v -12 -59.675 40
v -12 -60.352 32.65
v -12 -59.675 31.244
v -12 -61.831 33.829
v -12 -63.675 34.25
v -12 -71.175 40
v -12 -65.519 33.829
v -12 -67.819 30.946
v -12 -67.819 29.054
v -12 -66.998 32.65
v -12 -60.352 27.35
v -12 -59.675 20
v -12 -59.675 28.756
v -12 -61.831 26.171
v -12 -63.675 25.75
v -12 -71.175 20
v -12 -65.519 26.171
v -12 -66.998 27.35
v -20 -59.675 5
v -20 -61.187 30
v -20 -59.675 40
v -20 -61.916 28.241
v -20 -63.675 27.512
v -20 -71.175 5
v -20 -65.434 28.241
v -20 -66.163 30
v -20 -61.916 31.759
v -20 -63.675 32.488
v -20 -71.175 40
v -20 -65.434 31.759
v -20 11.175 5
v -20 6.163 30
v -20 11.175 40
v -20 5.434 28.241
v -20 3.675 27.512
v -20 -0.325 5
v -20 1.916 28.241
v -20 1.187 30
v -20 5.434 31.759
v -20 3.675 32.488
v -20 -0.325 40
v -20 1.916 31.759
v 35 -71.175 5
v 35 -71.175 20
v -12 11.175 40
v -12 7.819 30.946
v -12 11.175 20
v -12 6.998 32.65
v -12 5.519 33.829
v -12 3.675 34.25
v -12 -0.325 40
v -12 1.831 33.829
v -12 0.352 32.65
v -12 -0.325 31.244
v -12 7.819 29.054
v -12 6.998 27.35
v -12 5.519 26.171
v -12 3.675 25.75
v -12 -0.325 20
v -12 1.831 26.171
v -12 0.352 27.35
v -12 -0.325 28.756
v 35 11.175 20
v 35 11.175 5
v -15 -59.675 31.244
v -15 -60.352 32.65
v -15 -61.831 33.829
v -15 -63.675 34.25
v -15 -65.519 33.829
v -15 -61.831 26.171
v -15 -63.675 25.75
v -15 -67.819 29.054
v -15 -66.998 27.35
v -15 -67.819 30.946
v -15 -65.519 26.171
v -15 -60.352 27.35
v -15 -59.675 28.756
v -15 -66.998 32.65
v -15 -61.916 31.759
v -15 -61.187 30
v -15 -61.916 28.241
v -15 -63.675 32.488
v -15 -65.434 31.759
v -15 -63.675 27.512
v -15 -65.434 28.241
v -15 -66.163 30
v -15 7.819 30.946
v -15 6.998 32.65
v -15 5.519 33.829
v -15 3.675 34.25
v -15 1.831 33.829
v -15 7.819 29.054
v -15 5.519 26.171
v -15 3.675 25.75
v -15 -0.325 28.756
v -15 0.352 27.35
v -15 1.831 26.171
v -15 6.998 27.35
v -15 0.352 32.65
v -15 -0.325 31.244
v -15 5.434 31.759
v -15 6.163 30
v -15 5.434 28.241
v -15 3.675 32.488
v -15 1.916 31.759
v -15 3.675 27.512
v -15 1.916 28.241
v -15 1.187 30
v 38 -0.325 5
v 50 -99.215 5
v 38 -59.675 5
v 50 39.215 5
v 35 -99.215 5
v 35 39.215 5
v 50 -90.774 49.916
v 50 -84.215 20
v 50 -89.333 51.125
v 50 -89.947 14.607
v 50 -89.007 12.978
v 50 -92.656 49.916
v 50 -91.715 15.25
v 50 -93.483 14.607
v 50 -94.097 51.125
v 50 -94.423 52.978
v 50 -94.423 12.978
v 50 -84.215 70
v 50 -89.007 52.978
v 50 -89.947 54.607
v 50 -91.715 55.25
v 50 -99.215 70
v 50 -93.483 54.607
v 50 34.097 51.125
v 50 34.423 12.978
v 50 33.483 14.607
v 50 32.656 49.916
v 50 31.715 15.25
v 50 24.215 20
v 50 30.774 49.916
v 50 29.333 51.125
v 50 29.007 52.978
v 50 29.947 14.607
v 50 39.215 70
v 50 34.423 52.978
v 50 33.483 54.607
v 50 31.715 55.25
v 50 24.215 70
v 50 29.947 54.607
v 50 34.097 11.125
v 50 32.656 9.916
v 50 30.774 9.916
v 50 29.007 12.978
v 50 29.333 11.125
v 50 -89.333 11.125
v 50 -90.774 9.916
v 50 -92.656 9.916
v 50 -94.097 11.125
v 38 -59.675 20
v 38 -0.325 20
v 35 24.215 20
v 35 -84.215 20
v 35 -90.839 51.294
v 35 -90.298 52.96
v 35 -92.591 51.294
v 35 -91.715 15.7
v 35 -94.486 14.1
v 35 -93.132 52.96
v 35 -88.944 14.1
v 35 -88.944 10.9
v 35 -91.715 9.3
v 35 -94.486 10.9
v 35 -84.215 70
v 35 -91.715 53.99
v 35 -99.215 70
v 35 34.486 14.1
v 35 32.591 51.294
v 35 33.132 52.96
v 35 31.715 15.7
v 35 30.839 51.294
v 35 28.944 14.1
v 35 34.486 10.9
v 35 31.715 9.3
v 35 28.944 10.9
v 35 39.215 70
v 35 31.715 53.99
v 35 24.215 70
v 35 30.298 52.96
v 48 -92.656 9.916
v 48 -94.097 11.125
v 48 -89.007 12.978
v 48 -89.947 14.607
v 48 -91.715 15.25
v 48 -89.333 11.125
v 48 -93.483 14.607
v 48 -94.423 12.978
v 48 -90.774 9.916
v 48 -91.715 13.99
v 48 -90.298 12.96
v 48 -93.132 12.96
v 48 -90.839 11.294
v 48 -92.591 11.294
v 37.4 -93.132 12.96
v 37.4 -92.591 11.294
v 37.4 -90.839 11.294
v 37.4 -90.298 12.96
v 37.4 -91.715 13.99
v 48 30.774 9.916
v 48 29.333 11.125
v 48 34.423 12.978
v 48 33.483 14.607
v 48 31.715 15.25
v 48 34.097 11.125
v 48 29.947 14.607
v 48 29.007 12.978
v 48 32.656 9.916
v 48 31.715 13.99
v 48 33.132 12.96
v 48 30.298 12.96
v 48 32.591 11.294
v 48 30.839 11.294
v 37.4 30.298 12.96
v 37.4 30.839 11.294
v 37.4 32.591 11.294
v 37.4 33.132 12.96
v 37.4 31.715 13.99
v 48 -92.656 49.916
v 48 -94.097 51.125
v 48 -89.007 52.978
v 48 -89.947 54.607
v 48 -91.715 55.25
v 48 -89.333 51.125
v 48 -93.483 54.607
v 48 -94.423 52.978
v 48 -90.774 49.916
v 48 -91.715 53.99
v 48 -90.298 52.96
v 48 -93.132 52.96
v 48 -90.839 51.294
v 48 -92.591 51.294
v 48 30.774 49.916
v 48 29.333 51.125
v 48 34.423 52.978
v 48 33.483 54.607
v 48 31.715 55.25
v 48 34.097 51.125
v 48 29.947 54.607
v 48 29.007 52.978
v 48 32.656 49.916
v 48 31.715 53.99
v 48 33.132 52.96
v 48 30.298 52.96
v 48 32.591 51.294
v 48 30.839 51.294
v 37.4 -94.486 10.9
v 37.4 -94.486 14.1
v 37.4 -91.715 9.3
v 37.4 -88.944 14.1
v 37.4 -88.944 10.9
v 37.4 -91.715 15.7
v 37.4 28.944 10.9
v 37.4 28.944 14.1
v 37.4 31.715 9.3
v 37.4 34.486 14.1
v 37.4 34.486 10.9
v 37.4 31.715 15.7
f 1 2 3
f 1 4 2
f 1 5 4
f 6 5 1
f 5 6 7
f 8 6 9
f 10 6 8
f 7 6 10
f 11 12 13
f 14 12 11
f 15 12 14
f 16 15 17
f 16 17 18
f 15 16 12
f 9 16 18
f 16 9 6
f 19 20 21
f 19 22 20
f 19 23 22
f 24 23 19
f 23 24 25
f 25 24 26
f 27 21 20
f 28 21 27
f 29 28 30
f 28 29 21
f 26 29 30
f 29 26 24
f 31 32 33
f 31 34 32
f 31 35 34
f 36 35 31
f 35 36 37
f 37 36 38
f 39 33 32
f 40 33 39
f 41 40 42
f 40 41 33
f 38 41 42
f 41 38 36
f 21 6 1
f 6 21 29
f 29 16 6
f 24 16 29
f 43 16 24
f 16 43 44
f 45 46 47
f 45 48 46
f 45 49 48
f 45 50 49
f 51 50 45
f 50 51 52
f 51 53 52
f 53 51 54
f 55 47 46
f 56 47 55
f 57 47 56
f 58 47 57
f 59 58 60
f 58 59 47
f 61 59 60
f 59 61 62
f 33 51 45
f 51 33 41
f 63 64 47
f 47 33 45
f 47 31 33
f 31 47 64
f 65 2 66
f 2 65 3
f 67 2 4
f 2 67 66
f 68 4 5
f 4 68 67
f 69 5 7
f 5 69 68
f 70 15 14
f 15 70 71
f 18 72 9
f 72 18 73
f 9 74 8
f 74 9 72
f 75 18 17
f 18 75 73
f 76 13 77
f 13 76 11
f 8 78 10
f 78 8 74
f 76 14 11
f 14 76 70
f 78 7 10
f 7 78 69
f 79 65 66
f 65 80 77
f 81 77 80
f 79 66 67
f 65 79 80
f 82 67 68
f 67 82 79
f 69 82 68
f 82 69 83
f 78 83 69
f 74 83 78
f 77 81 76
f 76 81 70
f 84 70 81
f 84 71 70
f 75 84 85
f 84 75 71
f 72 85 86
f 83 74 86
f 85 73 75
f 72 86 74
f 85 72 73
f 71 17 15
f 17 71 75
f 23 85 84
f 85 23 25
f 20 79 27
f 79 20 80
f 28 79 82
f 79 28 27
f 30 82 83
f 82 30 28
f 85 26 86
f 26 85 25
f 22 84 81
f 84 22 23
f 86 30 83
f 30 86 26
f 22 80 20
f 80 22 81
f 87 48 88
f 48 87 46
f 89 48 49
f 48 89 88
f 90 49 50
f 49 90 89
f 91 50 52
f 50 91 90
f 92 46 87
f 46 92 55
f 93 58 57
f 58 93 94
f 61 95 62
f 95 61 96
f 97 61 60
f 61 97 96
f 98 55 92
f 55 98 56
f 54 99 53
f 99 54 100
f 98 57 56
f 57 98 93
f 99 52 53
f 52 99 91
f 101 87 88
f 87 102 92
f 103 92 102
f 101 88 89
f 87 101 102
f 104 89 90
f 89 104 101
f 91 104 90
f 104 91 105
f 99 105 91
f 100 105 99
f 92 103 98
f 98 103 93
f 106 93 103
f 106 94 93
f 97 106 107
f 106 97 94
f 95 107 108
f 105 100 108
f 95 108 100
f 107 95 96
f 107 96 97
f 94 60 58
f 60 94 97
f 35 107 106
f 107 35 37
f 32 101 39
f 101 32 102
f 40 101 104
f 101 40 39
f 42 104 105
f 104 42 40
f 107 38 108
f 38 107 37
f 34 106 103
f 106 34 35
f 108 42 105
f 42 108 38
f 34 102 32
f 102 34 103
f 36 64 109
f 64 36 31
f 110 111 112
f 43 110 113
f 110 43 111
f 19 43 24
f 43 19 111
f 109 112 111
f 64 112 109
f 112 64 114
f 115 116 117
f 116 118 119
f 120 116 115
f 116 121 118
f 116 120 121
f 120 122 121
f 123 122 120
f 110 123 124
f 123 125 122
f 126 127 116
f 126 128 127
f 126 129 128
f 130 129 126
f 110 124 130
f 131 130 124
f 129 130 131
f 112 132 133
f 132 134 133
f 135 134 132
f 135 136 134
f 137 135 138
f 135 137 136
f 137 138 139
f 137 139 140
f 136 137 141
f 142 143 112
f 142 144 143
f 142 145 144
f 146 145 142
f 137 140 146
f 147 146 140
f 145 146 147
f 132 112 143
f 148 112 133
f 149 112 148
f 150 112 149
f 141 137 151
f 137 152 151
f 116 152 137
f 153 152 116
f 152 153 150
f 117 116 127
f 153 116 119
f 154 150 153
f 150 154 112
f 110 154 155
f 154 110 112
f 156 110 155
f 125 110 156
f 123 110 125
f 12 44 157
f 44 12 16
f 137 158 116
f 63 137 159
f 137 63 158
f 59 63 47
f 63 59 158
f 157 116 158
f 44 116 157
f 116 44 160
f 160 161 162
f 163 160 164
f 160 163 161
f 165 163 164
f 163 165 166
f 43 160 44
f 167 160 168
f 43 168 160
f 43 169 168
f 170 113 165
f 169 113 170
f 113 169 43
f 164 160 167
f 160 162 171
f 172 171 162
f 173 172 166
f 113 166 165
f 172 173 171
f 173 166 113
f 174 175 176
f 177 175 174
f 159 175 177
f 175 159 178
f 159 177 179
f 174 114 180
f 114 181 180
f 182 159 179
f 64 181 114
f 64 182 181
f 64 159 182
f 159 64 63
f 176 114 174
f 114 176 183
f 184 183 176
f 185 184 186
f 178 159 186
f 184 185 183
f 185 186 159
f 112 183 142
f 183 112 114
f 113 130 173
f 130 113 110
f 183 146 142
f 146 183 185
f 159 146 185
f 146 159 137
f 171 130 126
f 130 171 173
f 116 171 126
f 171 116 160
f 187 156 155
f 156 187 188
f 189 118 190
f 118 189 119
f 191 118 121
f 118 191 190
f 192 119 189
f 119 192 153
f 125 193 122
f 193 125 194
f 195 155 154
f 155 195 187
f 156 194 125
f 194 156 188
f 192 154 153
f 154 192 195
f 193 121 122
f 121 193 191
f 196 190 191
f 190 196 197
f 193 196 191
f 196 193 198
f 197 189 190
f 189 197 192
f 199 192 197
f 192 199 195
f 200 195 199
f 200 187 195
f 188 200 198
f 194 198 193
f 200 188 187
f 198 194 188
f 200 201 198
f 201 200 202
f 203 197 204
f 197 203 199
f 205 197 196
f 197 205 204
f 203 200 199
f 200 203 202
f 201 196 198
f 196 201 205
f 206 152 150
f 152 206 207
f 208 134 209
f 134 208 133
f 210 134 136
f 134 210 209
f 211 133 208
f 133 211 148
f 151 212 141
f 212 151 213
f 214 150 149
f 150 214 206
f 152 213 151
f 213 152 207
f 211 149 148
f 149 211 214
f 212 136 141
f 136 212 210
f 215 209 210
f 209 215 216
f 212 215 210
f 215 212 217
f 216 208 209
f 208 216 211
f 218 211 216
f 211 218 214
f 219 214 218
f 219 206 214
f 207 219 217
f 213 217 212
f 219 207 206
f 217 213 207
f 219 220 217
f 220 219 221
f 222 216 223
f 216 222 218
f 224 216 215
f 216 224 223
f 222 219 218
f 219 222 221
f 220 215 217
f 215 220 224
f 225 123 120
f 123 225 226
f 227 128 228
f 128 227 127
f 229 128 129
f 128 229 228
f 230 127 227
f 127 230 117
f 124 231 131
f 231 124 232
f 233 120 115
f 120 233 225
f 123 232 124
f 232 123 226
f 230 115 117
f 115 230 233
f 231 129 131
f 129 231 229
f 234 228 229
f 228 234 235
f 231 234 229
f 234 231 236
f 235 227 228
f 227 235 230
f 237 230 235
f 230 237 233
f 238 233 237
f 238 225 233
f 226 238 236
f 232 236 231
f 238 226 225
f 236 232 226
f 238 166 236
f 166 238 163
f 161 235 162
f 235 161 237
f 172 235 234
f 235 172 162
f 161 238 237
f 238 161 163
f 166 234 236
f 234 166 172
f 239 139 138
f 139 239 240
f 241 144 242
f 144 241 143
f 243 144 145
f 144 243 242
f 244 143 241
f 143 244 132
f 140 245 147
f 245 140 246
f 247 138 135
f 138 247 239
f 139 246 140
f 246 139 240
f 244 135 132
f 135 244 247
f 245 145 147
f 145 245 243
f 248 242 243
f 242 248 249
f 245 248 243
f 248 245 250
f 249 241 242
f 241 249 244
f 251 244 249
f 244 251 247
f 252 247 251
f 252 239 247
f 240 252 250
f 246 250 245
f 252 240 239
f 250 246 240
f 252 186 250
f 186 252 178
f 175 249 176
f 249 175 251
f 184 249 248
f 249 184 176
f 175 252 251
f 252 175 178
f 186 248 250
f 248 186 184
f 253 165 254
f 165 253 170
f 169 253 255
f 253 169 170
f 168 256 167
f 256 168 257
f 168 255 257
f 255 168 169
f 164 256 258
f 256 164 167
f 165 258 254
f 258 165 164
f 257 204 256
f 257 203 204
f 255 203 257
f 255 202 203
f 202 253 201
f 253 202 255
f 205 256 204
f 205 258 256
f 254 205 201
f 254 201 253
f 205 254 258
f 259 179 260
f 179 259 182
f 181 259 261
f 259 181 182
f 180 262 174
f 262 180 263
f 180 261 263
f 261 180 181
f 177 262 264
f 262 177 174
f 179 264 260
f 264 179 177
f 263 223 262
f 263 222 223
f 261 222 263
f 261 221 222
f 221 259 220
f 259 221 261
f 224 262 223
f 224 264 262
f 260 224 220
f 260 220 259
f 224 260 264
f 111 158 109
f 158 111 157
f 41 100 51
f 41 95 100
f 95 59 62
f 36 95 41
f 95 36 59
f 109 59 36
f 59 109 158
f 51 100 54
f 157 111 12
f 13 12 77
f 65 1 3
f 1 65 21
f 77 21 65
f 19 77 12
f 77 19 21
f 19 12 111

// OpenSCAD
use <MCAD/nuts_and_bolts.scad>;
ox_screw_spacing = 67.35;
plate_to_tinyg = 70;
tinyg_screw_spacing = 123.43;
tinyg_beam_spacing = tinyg_screw_spacing + 15;
tinyg_xscrew_spacing = 40;
tinyg_xscrew_beam = tinyg_screw_spacing+5;
tinyg_yscrew_position = tinyg_screw_spacing;
tinyg_motor_size = 56.35;
tinyg_motor_length = 58;

module mount_holes()
{
    translate([0,-ox_screw_spacing/2,5]) rotate([0,180,0]) boltHole(5,length=12);
    translate([0,ox_screw_spacing/2,5])  rotate([0,180,0]) boltHole(5,length=12);
    
}

module mount_pads()
{
    translate([-10,-ox_screw_spacing/2-7.5,0])  cube([30,15,8]); 
    translate([-10,ox_screw_spacing/2-7.5,0])  cube([30,15,8]);   
}

module ox_plate_mount()
{
    difference(){
        mount_pads();
        mount_holes();
    }
}

module ox_mount_arms()
{
    translate([10,-ox_screw_spacing/2-7.5,0])  cube([15,15,plate_to_tinyg]);
    translate([10,ox_screw_spacing/2-7.5,0])  cube([15,15,plate_to_tinyg]); 
    translate([10,-tinyg_beam_spacing/2,plate_to_tinyg-15]) cube([15,tinyg_beam_spacing,15]);
    translate([0,-7.5,0]) translate([-tinyg_xscrew_spacing,tinyg_yscrew_position/2,plate_to_tinyg-15]) 
        cube([tinyg_xscrew_spacing+15,15,15]);
    translate([0,-7.5,0]) translate([-tinyg_xscrew_spacing,-tinyg_yscrew_position/2,plate_to_tinyg-15]) 
        cube([tinyg_xscrew_spacing+15,15,15]);
    
    
}

module tinyg_mount_holes()
{
    translate([17.5,-tinyg_screw_spacing/2,plate_to_tinyg-2]) rotate([0,180,0]) boltHole(3,length=18);
    translate([17.5,tinyg_screw_spacing/2,plate_to_tinyg-2])  rotate([0,180,0]) boltHole(3,length=18);
    translate([17.5,-tinyg_screw_spacing/2,plate_to_tinyg-15]) nutHole(3.1,length=18);
    translate([17.5,tinyg_screw_spacing/2,plate_to_tinyg-15])   nutHole(3.1,length=18);
    translate([17.5-tinyg_xscrew_spacing,-tinyg_screw_spacing/2,plate_to_tinyg-2]) rotate([0,180,0]) boltHole(3,length=18);
    translate([17.5-tinyg_xscrew_spacing,tinyg_screw_spacing/2,plate_to_tinyg-2])  rotate([0,180,0]) boltHole(3,length=18);
    %translate([17.5-tinyg_xscrew_spacing,-tinyg_screw_spacing/2,plate_to_tinyg-15]) nutHole(3.1,length=18);
    %translate([17.5-tinyg_xscrew_spacing,tinyg_screw_spacing/2,plate_to_tinyg-15])   nutHole(3.1,length=18);
    
}


module ox_motor()
{
    
//%translate([-tinyg_motor_size/2,-tinyg_motor_size/2,0]) cube([tinyg_motor_size,tinyg_motor_size,tinyg_motor_length]);
motorcut=tinyg_motor_size+3;
translate([-motorcut/2,-motorcut/2,0]) cube([motorcut,motorcut,tinyg_motor_length]);    
}


module ox_mount_frame()
{
ox_plate_mount();
difference(){
    ox_mount_arms();
    tinyg_mount_holes();
    
    }
}


module ox_mount()
{
    difference(){
        ox_mount_frame();
        ox_motor();
        }
    }
    
    
rotate([0,90,0]) translate([-30,-30,-20]) ox_mount();
